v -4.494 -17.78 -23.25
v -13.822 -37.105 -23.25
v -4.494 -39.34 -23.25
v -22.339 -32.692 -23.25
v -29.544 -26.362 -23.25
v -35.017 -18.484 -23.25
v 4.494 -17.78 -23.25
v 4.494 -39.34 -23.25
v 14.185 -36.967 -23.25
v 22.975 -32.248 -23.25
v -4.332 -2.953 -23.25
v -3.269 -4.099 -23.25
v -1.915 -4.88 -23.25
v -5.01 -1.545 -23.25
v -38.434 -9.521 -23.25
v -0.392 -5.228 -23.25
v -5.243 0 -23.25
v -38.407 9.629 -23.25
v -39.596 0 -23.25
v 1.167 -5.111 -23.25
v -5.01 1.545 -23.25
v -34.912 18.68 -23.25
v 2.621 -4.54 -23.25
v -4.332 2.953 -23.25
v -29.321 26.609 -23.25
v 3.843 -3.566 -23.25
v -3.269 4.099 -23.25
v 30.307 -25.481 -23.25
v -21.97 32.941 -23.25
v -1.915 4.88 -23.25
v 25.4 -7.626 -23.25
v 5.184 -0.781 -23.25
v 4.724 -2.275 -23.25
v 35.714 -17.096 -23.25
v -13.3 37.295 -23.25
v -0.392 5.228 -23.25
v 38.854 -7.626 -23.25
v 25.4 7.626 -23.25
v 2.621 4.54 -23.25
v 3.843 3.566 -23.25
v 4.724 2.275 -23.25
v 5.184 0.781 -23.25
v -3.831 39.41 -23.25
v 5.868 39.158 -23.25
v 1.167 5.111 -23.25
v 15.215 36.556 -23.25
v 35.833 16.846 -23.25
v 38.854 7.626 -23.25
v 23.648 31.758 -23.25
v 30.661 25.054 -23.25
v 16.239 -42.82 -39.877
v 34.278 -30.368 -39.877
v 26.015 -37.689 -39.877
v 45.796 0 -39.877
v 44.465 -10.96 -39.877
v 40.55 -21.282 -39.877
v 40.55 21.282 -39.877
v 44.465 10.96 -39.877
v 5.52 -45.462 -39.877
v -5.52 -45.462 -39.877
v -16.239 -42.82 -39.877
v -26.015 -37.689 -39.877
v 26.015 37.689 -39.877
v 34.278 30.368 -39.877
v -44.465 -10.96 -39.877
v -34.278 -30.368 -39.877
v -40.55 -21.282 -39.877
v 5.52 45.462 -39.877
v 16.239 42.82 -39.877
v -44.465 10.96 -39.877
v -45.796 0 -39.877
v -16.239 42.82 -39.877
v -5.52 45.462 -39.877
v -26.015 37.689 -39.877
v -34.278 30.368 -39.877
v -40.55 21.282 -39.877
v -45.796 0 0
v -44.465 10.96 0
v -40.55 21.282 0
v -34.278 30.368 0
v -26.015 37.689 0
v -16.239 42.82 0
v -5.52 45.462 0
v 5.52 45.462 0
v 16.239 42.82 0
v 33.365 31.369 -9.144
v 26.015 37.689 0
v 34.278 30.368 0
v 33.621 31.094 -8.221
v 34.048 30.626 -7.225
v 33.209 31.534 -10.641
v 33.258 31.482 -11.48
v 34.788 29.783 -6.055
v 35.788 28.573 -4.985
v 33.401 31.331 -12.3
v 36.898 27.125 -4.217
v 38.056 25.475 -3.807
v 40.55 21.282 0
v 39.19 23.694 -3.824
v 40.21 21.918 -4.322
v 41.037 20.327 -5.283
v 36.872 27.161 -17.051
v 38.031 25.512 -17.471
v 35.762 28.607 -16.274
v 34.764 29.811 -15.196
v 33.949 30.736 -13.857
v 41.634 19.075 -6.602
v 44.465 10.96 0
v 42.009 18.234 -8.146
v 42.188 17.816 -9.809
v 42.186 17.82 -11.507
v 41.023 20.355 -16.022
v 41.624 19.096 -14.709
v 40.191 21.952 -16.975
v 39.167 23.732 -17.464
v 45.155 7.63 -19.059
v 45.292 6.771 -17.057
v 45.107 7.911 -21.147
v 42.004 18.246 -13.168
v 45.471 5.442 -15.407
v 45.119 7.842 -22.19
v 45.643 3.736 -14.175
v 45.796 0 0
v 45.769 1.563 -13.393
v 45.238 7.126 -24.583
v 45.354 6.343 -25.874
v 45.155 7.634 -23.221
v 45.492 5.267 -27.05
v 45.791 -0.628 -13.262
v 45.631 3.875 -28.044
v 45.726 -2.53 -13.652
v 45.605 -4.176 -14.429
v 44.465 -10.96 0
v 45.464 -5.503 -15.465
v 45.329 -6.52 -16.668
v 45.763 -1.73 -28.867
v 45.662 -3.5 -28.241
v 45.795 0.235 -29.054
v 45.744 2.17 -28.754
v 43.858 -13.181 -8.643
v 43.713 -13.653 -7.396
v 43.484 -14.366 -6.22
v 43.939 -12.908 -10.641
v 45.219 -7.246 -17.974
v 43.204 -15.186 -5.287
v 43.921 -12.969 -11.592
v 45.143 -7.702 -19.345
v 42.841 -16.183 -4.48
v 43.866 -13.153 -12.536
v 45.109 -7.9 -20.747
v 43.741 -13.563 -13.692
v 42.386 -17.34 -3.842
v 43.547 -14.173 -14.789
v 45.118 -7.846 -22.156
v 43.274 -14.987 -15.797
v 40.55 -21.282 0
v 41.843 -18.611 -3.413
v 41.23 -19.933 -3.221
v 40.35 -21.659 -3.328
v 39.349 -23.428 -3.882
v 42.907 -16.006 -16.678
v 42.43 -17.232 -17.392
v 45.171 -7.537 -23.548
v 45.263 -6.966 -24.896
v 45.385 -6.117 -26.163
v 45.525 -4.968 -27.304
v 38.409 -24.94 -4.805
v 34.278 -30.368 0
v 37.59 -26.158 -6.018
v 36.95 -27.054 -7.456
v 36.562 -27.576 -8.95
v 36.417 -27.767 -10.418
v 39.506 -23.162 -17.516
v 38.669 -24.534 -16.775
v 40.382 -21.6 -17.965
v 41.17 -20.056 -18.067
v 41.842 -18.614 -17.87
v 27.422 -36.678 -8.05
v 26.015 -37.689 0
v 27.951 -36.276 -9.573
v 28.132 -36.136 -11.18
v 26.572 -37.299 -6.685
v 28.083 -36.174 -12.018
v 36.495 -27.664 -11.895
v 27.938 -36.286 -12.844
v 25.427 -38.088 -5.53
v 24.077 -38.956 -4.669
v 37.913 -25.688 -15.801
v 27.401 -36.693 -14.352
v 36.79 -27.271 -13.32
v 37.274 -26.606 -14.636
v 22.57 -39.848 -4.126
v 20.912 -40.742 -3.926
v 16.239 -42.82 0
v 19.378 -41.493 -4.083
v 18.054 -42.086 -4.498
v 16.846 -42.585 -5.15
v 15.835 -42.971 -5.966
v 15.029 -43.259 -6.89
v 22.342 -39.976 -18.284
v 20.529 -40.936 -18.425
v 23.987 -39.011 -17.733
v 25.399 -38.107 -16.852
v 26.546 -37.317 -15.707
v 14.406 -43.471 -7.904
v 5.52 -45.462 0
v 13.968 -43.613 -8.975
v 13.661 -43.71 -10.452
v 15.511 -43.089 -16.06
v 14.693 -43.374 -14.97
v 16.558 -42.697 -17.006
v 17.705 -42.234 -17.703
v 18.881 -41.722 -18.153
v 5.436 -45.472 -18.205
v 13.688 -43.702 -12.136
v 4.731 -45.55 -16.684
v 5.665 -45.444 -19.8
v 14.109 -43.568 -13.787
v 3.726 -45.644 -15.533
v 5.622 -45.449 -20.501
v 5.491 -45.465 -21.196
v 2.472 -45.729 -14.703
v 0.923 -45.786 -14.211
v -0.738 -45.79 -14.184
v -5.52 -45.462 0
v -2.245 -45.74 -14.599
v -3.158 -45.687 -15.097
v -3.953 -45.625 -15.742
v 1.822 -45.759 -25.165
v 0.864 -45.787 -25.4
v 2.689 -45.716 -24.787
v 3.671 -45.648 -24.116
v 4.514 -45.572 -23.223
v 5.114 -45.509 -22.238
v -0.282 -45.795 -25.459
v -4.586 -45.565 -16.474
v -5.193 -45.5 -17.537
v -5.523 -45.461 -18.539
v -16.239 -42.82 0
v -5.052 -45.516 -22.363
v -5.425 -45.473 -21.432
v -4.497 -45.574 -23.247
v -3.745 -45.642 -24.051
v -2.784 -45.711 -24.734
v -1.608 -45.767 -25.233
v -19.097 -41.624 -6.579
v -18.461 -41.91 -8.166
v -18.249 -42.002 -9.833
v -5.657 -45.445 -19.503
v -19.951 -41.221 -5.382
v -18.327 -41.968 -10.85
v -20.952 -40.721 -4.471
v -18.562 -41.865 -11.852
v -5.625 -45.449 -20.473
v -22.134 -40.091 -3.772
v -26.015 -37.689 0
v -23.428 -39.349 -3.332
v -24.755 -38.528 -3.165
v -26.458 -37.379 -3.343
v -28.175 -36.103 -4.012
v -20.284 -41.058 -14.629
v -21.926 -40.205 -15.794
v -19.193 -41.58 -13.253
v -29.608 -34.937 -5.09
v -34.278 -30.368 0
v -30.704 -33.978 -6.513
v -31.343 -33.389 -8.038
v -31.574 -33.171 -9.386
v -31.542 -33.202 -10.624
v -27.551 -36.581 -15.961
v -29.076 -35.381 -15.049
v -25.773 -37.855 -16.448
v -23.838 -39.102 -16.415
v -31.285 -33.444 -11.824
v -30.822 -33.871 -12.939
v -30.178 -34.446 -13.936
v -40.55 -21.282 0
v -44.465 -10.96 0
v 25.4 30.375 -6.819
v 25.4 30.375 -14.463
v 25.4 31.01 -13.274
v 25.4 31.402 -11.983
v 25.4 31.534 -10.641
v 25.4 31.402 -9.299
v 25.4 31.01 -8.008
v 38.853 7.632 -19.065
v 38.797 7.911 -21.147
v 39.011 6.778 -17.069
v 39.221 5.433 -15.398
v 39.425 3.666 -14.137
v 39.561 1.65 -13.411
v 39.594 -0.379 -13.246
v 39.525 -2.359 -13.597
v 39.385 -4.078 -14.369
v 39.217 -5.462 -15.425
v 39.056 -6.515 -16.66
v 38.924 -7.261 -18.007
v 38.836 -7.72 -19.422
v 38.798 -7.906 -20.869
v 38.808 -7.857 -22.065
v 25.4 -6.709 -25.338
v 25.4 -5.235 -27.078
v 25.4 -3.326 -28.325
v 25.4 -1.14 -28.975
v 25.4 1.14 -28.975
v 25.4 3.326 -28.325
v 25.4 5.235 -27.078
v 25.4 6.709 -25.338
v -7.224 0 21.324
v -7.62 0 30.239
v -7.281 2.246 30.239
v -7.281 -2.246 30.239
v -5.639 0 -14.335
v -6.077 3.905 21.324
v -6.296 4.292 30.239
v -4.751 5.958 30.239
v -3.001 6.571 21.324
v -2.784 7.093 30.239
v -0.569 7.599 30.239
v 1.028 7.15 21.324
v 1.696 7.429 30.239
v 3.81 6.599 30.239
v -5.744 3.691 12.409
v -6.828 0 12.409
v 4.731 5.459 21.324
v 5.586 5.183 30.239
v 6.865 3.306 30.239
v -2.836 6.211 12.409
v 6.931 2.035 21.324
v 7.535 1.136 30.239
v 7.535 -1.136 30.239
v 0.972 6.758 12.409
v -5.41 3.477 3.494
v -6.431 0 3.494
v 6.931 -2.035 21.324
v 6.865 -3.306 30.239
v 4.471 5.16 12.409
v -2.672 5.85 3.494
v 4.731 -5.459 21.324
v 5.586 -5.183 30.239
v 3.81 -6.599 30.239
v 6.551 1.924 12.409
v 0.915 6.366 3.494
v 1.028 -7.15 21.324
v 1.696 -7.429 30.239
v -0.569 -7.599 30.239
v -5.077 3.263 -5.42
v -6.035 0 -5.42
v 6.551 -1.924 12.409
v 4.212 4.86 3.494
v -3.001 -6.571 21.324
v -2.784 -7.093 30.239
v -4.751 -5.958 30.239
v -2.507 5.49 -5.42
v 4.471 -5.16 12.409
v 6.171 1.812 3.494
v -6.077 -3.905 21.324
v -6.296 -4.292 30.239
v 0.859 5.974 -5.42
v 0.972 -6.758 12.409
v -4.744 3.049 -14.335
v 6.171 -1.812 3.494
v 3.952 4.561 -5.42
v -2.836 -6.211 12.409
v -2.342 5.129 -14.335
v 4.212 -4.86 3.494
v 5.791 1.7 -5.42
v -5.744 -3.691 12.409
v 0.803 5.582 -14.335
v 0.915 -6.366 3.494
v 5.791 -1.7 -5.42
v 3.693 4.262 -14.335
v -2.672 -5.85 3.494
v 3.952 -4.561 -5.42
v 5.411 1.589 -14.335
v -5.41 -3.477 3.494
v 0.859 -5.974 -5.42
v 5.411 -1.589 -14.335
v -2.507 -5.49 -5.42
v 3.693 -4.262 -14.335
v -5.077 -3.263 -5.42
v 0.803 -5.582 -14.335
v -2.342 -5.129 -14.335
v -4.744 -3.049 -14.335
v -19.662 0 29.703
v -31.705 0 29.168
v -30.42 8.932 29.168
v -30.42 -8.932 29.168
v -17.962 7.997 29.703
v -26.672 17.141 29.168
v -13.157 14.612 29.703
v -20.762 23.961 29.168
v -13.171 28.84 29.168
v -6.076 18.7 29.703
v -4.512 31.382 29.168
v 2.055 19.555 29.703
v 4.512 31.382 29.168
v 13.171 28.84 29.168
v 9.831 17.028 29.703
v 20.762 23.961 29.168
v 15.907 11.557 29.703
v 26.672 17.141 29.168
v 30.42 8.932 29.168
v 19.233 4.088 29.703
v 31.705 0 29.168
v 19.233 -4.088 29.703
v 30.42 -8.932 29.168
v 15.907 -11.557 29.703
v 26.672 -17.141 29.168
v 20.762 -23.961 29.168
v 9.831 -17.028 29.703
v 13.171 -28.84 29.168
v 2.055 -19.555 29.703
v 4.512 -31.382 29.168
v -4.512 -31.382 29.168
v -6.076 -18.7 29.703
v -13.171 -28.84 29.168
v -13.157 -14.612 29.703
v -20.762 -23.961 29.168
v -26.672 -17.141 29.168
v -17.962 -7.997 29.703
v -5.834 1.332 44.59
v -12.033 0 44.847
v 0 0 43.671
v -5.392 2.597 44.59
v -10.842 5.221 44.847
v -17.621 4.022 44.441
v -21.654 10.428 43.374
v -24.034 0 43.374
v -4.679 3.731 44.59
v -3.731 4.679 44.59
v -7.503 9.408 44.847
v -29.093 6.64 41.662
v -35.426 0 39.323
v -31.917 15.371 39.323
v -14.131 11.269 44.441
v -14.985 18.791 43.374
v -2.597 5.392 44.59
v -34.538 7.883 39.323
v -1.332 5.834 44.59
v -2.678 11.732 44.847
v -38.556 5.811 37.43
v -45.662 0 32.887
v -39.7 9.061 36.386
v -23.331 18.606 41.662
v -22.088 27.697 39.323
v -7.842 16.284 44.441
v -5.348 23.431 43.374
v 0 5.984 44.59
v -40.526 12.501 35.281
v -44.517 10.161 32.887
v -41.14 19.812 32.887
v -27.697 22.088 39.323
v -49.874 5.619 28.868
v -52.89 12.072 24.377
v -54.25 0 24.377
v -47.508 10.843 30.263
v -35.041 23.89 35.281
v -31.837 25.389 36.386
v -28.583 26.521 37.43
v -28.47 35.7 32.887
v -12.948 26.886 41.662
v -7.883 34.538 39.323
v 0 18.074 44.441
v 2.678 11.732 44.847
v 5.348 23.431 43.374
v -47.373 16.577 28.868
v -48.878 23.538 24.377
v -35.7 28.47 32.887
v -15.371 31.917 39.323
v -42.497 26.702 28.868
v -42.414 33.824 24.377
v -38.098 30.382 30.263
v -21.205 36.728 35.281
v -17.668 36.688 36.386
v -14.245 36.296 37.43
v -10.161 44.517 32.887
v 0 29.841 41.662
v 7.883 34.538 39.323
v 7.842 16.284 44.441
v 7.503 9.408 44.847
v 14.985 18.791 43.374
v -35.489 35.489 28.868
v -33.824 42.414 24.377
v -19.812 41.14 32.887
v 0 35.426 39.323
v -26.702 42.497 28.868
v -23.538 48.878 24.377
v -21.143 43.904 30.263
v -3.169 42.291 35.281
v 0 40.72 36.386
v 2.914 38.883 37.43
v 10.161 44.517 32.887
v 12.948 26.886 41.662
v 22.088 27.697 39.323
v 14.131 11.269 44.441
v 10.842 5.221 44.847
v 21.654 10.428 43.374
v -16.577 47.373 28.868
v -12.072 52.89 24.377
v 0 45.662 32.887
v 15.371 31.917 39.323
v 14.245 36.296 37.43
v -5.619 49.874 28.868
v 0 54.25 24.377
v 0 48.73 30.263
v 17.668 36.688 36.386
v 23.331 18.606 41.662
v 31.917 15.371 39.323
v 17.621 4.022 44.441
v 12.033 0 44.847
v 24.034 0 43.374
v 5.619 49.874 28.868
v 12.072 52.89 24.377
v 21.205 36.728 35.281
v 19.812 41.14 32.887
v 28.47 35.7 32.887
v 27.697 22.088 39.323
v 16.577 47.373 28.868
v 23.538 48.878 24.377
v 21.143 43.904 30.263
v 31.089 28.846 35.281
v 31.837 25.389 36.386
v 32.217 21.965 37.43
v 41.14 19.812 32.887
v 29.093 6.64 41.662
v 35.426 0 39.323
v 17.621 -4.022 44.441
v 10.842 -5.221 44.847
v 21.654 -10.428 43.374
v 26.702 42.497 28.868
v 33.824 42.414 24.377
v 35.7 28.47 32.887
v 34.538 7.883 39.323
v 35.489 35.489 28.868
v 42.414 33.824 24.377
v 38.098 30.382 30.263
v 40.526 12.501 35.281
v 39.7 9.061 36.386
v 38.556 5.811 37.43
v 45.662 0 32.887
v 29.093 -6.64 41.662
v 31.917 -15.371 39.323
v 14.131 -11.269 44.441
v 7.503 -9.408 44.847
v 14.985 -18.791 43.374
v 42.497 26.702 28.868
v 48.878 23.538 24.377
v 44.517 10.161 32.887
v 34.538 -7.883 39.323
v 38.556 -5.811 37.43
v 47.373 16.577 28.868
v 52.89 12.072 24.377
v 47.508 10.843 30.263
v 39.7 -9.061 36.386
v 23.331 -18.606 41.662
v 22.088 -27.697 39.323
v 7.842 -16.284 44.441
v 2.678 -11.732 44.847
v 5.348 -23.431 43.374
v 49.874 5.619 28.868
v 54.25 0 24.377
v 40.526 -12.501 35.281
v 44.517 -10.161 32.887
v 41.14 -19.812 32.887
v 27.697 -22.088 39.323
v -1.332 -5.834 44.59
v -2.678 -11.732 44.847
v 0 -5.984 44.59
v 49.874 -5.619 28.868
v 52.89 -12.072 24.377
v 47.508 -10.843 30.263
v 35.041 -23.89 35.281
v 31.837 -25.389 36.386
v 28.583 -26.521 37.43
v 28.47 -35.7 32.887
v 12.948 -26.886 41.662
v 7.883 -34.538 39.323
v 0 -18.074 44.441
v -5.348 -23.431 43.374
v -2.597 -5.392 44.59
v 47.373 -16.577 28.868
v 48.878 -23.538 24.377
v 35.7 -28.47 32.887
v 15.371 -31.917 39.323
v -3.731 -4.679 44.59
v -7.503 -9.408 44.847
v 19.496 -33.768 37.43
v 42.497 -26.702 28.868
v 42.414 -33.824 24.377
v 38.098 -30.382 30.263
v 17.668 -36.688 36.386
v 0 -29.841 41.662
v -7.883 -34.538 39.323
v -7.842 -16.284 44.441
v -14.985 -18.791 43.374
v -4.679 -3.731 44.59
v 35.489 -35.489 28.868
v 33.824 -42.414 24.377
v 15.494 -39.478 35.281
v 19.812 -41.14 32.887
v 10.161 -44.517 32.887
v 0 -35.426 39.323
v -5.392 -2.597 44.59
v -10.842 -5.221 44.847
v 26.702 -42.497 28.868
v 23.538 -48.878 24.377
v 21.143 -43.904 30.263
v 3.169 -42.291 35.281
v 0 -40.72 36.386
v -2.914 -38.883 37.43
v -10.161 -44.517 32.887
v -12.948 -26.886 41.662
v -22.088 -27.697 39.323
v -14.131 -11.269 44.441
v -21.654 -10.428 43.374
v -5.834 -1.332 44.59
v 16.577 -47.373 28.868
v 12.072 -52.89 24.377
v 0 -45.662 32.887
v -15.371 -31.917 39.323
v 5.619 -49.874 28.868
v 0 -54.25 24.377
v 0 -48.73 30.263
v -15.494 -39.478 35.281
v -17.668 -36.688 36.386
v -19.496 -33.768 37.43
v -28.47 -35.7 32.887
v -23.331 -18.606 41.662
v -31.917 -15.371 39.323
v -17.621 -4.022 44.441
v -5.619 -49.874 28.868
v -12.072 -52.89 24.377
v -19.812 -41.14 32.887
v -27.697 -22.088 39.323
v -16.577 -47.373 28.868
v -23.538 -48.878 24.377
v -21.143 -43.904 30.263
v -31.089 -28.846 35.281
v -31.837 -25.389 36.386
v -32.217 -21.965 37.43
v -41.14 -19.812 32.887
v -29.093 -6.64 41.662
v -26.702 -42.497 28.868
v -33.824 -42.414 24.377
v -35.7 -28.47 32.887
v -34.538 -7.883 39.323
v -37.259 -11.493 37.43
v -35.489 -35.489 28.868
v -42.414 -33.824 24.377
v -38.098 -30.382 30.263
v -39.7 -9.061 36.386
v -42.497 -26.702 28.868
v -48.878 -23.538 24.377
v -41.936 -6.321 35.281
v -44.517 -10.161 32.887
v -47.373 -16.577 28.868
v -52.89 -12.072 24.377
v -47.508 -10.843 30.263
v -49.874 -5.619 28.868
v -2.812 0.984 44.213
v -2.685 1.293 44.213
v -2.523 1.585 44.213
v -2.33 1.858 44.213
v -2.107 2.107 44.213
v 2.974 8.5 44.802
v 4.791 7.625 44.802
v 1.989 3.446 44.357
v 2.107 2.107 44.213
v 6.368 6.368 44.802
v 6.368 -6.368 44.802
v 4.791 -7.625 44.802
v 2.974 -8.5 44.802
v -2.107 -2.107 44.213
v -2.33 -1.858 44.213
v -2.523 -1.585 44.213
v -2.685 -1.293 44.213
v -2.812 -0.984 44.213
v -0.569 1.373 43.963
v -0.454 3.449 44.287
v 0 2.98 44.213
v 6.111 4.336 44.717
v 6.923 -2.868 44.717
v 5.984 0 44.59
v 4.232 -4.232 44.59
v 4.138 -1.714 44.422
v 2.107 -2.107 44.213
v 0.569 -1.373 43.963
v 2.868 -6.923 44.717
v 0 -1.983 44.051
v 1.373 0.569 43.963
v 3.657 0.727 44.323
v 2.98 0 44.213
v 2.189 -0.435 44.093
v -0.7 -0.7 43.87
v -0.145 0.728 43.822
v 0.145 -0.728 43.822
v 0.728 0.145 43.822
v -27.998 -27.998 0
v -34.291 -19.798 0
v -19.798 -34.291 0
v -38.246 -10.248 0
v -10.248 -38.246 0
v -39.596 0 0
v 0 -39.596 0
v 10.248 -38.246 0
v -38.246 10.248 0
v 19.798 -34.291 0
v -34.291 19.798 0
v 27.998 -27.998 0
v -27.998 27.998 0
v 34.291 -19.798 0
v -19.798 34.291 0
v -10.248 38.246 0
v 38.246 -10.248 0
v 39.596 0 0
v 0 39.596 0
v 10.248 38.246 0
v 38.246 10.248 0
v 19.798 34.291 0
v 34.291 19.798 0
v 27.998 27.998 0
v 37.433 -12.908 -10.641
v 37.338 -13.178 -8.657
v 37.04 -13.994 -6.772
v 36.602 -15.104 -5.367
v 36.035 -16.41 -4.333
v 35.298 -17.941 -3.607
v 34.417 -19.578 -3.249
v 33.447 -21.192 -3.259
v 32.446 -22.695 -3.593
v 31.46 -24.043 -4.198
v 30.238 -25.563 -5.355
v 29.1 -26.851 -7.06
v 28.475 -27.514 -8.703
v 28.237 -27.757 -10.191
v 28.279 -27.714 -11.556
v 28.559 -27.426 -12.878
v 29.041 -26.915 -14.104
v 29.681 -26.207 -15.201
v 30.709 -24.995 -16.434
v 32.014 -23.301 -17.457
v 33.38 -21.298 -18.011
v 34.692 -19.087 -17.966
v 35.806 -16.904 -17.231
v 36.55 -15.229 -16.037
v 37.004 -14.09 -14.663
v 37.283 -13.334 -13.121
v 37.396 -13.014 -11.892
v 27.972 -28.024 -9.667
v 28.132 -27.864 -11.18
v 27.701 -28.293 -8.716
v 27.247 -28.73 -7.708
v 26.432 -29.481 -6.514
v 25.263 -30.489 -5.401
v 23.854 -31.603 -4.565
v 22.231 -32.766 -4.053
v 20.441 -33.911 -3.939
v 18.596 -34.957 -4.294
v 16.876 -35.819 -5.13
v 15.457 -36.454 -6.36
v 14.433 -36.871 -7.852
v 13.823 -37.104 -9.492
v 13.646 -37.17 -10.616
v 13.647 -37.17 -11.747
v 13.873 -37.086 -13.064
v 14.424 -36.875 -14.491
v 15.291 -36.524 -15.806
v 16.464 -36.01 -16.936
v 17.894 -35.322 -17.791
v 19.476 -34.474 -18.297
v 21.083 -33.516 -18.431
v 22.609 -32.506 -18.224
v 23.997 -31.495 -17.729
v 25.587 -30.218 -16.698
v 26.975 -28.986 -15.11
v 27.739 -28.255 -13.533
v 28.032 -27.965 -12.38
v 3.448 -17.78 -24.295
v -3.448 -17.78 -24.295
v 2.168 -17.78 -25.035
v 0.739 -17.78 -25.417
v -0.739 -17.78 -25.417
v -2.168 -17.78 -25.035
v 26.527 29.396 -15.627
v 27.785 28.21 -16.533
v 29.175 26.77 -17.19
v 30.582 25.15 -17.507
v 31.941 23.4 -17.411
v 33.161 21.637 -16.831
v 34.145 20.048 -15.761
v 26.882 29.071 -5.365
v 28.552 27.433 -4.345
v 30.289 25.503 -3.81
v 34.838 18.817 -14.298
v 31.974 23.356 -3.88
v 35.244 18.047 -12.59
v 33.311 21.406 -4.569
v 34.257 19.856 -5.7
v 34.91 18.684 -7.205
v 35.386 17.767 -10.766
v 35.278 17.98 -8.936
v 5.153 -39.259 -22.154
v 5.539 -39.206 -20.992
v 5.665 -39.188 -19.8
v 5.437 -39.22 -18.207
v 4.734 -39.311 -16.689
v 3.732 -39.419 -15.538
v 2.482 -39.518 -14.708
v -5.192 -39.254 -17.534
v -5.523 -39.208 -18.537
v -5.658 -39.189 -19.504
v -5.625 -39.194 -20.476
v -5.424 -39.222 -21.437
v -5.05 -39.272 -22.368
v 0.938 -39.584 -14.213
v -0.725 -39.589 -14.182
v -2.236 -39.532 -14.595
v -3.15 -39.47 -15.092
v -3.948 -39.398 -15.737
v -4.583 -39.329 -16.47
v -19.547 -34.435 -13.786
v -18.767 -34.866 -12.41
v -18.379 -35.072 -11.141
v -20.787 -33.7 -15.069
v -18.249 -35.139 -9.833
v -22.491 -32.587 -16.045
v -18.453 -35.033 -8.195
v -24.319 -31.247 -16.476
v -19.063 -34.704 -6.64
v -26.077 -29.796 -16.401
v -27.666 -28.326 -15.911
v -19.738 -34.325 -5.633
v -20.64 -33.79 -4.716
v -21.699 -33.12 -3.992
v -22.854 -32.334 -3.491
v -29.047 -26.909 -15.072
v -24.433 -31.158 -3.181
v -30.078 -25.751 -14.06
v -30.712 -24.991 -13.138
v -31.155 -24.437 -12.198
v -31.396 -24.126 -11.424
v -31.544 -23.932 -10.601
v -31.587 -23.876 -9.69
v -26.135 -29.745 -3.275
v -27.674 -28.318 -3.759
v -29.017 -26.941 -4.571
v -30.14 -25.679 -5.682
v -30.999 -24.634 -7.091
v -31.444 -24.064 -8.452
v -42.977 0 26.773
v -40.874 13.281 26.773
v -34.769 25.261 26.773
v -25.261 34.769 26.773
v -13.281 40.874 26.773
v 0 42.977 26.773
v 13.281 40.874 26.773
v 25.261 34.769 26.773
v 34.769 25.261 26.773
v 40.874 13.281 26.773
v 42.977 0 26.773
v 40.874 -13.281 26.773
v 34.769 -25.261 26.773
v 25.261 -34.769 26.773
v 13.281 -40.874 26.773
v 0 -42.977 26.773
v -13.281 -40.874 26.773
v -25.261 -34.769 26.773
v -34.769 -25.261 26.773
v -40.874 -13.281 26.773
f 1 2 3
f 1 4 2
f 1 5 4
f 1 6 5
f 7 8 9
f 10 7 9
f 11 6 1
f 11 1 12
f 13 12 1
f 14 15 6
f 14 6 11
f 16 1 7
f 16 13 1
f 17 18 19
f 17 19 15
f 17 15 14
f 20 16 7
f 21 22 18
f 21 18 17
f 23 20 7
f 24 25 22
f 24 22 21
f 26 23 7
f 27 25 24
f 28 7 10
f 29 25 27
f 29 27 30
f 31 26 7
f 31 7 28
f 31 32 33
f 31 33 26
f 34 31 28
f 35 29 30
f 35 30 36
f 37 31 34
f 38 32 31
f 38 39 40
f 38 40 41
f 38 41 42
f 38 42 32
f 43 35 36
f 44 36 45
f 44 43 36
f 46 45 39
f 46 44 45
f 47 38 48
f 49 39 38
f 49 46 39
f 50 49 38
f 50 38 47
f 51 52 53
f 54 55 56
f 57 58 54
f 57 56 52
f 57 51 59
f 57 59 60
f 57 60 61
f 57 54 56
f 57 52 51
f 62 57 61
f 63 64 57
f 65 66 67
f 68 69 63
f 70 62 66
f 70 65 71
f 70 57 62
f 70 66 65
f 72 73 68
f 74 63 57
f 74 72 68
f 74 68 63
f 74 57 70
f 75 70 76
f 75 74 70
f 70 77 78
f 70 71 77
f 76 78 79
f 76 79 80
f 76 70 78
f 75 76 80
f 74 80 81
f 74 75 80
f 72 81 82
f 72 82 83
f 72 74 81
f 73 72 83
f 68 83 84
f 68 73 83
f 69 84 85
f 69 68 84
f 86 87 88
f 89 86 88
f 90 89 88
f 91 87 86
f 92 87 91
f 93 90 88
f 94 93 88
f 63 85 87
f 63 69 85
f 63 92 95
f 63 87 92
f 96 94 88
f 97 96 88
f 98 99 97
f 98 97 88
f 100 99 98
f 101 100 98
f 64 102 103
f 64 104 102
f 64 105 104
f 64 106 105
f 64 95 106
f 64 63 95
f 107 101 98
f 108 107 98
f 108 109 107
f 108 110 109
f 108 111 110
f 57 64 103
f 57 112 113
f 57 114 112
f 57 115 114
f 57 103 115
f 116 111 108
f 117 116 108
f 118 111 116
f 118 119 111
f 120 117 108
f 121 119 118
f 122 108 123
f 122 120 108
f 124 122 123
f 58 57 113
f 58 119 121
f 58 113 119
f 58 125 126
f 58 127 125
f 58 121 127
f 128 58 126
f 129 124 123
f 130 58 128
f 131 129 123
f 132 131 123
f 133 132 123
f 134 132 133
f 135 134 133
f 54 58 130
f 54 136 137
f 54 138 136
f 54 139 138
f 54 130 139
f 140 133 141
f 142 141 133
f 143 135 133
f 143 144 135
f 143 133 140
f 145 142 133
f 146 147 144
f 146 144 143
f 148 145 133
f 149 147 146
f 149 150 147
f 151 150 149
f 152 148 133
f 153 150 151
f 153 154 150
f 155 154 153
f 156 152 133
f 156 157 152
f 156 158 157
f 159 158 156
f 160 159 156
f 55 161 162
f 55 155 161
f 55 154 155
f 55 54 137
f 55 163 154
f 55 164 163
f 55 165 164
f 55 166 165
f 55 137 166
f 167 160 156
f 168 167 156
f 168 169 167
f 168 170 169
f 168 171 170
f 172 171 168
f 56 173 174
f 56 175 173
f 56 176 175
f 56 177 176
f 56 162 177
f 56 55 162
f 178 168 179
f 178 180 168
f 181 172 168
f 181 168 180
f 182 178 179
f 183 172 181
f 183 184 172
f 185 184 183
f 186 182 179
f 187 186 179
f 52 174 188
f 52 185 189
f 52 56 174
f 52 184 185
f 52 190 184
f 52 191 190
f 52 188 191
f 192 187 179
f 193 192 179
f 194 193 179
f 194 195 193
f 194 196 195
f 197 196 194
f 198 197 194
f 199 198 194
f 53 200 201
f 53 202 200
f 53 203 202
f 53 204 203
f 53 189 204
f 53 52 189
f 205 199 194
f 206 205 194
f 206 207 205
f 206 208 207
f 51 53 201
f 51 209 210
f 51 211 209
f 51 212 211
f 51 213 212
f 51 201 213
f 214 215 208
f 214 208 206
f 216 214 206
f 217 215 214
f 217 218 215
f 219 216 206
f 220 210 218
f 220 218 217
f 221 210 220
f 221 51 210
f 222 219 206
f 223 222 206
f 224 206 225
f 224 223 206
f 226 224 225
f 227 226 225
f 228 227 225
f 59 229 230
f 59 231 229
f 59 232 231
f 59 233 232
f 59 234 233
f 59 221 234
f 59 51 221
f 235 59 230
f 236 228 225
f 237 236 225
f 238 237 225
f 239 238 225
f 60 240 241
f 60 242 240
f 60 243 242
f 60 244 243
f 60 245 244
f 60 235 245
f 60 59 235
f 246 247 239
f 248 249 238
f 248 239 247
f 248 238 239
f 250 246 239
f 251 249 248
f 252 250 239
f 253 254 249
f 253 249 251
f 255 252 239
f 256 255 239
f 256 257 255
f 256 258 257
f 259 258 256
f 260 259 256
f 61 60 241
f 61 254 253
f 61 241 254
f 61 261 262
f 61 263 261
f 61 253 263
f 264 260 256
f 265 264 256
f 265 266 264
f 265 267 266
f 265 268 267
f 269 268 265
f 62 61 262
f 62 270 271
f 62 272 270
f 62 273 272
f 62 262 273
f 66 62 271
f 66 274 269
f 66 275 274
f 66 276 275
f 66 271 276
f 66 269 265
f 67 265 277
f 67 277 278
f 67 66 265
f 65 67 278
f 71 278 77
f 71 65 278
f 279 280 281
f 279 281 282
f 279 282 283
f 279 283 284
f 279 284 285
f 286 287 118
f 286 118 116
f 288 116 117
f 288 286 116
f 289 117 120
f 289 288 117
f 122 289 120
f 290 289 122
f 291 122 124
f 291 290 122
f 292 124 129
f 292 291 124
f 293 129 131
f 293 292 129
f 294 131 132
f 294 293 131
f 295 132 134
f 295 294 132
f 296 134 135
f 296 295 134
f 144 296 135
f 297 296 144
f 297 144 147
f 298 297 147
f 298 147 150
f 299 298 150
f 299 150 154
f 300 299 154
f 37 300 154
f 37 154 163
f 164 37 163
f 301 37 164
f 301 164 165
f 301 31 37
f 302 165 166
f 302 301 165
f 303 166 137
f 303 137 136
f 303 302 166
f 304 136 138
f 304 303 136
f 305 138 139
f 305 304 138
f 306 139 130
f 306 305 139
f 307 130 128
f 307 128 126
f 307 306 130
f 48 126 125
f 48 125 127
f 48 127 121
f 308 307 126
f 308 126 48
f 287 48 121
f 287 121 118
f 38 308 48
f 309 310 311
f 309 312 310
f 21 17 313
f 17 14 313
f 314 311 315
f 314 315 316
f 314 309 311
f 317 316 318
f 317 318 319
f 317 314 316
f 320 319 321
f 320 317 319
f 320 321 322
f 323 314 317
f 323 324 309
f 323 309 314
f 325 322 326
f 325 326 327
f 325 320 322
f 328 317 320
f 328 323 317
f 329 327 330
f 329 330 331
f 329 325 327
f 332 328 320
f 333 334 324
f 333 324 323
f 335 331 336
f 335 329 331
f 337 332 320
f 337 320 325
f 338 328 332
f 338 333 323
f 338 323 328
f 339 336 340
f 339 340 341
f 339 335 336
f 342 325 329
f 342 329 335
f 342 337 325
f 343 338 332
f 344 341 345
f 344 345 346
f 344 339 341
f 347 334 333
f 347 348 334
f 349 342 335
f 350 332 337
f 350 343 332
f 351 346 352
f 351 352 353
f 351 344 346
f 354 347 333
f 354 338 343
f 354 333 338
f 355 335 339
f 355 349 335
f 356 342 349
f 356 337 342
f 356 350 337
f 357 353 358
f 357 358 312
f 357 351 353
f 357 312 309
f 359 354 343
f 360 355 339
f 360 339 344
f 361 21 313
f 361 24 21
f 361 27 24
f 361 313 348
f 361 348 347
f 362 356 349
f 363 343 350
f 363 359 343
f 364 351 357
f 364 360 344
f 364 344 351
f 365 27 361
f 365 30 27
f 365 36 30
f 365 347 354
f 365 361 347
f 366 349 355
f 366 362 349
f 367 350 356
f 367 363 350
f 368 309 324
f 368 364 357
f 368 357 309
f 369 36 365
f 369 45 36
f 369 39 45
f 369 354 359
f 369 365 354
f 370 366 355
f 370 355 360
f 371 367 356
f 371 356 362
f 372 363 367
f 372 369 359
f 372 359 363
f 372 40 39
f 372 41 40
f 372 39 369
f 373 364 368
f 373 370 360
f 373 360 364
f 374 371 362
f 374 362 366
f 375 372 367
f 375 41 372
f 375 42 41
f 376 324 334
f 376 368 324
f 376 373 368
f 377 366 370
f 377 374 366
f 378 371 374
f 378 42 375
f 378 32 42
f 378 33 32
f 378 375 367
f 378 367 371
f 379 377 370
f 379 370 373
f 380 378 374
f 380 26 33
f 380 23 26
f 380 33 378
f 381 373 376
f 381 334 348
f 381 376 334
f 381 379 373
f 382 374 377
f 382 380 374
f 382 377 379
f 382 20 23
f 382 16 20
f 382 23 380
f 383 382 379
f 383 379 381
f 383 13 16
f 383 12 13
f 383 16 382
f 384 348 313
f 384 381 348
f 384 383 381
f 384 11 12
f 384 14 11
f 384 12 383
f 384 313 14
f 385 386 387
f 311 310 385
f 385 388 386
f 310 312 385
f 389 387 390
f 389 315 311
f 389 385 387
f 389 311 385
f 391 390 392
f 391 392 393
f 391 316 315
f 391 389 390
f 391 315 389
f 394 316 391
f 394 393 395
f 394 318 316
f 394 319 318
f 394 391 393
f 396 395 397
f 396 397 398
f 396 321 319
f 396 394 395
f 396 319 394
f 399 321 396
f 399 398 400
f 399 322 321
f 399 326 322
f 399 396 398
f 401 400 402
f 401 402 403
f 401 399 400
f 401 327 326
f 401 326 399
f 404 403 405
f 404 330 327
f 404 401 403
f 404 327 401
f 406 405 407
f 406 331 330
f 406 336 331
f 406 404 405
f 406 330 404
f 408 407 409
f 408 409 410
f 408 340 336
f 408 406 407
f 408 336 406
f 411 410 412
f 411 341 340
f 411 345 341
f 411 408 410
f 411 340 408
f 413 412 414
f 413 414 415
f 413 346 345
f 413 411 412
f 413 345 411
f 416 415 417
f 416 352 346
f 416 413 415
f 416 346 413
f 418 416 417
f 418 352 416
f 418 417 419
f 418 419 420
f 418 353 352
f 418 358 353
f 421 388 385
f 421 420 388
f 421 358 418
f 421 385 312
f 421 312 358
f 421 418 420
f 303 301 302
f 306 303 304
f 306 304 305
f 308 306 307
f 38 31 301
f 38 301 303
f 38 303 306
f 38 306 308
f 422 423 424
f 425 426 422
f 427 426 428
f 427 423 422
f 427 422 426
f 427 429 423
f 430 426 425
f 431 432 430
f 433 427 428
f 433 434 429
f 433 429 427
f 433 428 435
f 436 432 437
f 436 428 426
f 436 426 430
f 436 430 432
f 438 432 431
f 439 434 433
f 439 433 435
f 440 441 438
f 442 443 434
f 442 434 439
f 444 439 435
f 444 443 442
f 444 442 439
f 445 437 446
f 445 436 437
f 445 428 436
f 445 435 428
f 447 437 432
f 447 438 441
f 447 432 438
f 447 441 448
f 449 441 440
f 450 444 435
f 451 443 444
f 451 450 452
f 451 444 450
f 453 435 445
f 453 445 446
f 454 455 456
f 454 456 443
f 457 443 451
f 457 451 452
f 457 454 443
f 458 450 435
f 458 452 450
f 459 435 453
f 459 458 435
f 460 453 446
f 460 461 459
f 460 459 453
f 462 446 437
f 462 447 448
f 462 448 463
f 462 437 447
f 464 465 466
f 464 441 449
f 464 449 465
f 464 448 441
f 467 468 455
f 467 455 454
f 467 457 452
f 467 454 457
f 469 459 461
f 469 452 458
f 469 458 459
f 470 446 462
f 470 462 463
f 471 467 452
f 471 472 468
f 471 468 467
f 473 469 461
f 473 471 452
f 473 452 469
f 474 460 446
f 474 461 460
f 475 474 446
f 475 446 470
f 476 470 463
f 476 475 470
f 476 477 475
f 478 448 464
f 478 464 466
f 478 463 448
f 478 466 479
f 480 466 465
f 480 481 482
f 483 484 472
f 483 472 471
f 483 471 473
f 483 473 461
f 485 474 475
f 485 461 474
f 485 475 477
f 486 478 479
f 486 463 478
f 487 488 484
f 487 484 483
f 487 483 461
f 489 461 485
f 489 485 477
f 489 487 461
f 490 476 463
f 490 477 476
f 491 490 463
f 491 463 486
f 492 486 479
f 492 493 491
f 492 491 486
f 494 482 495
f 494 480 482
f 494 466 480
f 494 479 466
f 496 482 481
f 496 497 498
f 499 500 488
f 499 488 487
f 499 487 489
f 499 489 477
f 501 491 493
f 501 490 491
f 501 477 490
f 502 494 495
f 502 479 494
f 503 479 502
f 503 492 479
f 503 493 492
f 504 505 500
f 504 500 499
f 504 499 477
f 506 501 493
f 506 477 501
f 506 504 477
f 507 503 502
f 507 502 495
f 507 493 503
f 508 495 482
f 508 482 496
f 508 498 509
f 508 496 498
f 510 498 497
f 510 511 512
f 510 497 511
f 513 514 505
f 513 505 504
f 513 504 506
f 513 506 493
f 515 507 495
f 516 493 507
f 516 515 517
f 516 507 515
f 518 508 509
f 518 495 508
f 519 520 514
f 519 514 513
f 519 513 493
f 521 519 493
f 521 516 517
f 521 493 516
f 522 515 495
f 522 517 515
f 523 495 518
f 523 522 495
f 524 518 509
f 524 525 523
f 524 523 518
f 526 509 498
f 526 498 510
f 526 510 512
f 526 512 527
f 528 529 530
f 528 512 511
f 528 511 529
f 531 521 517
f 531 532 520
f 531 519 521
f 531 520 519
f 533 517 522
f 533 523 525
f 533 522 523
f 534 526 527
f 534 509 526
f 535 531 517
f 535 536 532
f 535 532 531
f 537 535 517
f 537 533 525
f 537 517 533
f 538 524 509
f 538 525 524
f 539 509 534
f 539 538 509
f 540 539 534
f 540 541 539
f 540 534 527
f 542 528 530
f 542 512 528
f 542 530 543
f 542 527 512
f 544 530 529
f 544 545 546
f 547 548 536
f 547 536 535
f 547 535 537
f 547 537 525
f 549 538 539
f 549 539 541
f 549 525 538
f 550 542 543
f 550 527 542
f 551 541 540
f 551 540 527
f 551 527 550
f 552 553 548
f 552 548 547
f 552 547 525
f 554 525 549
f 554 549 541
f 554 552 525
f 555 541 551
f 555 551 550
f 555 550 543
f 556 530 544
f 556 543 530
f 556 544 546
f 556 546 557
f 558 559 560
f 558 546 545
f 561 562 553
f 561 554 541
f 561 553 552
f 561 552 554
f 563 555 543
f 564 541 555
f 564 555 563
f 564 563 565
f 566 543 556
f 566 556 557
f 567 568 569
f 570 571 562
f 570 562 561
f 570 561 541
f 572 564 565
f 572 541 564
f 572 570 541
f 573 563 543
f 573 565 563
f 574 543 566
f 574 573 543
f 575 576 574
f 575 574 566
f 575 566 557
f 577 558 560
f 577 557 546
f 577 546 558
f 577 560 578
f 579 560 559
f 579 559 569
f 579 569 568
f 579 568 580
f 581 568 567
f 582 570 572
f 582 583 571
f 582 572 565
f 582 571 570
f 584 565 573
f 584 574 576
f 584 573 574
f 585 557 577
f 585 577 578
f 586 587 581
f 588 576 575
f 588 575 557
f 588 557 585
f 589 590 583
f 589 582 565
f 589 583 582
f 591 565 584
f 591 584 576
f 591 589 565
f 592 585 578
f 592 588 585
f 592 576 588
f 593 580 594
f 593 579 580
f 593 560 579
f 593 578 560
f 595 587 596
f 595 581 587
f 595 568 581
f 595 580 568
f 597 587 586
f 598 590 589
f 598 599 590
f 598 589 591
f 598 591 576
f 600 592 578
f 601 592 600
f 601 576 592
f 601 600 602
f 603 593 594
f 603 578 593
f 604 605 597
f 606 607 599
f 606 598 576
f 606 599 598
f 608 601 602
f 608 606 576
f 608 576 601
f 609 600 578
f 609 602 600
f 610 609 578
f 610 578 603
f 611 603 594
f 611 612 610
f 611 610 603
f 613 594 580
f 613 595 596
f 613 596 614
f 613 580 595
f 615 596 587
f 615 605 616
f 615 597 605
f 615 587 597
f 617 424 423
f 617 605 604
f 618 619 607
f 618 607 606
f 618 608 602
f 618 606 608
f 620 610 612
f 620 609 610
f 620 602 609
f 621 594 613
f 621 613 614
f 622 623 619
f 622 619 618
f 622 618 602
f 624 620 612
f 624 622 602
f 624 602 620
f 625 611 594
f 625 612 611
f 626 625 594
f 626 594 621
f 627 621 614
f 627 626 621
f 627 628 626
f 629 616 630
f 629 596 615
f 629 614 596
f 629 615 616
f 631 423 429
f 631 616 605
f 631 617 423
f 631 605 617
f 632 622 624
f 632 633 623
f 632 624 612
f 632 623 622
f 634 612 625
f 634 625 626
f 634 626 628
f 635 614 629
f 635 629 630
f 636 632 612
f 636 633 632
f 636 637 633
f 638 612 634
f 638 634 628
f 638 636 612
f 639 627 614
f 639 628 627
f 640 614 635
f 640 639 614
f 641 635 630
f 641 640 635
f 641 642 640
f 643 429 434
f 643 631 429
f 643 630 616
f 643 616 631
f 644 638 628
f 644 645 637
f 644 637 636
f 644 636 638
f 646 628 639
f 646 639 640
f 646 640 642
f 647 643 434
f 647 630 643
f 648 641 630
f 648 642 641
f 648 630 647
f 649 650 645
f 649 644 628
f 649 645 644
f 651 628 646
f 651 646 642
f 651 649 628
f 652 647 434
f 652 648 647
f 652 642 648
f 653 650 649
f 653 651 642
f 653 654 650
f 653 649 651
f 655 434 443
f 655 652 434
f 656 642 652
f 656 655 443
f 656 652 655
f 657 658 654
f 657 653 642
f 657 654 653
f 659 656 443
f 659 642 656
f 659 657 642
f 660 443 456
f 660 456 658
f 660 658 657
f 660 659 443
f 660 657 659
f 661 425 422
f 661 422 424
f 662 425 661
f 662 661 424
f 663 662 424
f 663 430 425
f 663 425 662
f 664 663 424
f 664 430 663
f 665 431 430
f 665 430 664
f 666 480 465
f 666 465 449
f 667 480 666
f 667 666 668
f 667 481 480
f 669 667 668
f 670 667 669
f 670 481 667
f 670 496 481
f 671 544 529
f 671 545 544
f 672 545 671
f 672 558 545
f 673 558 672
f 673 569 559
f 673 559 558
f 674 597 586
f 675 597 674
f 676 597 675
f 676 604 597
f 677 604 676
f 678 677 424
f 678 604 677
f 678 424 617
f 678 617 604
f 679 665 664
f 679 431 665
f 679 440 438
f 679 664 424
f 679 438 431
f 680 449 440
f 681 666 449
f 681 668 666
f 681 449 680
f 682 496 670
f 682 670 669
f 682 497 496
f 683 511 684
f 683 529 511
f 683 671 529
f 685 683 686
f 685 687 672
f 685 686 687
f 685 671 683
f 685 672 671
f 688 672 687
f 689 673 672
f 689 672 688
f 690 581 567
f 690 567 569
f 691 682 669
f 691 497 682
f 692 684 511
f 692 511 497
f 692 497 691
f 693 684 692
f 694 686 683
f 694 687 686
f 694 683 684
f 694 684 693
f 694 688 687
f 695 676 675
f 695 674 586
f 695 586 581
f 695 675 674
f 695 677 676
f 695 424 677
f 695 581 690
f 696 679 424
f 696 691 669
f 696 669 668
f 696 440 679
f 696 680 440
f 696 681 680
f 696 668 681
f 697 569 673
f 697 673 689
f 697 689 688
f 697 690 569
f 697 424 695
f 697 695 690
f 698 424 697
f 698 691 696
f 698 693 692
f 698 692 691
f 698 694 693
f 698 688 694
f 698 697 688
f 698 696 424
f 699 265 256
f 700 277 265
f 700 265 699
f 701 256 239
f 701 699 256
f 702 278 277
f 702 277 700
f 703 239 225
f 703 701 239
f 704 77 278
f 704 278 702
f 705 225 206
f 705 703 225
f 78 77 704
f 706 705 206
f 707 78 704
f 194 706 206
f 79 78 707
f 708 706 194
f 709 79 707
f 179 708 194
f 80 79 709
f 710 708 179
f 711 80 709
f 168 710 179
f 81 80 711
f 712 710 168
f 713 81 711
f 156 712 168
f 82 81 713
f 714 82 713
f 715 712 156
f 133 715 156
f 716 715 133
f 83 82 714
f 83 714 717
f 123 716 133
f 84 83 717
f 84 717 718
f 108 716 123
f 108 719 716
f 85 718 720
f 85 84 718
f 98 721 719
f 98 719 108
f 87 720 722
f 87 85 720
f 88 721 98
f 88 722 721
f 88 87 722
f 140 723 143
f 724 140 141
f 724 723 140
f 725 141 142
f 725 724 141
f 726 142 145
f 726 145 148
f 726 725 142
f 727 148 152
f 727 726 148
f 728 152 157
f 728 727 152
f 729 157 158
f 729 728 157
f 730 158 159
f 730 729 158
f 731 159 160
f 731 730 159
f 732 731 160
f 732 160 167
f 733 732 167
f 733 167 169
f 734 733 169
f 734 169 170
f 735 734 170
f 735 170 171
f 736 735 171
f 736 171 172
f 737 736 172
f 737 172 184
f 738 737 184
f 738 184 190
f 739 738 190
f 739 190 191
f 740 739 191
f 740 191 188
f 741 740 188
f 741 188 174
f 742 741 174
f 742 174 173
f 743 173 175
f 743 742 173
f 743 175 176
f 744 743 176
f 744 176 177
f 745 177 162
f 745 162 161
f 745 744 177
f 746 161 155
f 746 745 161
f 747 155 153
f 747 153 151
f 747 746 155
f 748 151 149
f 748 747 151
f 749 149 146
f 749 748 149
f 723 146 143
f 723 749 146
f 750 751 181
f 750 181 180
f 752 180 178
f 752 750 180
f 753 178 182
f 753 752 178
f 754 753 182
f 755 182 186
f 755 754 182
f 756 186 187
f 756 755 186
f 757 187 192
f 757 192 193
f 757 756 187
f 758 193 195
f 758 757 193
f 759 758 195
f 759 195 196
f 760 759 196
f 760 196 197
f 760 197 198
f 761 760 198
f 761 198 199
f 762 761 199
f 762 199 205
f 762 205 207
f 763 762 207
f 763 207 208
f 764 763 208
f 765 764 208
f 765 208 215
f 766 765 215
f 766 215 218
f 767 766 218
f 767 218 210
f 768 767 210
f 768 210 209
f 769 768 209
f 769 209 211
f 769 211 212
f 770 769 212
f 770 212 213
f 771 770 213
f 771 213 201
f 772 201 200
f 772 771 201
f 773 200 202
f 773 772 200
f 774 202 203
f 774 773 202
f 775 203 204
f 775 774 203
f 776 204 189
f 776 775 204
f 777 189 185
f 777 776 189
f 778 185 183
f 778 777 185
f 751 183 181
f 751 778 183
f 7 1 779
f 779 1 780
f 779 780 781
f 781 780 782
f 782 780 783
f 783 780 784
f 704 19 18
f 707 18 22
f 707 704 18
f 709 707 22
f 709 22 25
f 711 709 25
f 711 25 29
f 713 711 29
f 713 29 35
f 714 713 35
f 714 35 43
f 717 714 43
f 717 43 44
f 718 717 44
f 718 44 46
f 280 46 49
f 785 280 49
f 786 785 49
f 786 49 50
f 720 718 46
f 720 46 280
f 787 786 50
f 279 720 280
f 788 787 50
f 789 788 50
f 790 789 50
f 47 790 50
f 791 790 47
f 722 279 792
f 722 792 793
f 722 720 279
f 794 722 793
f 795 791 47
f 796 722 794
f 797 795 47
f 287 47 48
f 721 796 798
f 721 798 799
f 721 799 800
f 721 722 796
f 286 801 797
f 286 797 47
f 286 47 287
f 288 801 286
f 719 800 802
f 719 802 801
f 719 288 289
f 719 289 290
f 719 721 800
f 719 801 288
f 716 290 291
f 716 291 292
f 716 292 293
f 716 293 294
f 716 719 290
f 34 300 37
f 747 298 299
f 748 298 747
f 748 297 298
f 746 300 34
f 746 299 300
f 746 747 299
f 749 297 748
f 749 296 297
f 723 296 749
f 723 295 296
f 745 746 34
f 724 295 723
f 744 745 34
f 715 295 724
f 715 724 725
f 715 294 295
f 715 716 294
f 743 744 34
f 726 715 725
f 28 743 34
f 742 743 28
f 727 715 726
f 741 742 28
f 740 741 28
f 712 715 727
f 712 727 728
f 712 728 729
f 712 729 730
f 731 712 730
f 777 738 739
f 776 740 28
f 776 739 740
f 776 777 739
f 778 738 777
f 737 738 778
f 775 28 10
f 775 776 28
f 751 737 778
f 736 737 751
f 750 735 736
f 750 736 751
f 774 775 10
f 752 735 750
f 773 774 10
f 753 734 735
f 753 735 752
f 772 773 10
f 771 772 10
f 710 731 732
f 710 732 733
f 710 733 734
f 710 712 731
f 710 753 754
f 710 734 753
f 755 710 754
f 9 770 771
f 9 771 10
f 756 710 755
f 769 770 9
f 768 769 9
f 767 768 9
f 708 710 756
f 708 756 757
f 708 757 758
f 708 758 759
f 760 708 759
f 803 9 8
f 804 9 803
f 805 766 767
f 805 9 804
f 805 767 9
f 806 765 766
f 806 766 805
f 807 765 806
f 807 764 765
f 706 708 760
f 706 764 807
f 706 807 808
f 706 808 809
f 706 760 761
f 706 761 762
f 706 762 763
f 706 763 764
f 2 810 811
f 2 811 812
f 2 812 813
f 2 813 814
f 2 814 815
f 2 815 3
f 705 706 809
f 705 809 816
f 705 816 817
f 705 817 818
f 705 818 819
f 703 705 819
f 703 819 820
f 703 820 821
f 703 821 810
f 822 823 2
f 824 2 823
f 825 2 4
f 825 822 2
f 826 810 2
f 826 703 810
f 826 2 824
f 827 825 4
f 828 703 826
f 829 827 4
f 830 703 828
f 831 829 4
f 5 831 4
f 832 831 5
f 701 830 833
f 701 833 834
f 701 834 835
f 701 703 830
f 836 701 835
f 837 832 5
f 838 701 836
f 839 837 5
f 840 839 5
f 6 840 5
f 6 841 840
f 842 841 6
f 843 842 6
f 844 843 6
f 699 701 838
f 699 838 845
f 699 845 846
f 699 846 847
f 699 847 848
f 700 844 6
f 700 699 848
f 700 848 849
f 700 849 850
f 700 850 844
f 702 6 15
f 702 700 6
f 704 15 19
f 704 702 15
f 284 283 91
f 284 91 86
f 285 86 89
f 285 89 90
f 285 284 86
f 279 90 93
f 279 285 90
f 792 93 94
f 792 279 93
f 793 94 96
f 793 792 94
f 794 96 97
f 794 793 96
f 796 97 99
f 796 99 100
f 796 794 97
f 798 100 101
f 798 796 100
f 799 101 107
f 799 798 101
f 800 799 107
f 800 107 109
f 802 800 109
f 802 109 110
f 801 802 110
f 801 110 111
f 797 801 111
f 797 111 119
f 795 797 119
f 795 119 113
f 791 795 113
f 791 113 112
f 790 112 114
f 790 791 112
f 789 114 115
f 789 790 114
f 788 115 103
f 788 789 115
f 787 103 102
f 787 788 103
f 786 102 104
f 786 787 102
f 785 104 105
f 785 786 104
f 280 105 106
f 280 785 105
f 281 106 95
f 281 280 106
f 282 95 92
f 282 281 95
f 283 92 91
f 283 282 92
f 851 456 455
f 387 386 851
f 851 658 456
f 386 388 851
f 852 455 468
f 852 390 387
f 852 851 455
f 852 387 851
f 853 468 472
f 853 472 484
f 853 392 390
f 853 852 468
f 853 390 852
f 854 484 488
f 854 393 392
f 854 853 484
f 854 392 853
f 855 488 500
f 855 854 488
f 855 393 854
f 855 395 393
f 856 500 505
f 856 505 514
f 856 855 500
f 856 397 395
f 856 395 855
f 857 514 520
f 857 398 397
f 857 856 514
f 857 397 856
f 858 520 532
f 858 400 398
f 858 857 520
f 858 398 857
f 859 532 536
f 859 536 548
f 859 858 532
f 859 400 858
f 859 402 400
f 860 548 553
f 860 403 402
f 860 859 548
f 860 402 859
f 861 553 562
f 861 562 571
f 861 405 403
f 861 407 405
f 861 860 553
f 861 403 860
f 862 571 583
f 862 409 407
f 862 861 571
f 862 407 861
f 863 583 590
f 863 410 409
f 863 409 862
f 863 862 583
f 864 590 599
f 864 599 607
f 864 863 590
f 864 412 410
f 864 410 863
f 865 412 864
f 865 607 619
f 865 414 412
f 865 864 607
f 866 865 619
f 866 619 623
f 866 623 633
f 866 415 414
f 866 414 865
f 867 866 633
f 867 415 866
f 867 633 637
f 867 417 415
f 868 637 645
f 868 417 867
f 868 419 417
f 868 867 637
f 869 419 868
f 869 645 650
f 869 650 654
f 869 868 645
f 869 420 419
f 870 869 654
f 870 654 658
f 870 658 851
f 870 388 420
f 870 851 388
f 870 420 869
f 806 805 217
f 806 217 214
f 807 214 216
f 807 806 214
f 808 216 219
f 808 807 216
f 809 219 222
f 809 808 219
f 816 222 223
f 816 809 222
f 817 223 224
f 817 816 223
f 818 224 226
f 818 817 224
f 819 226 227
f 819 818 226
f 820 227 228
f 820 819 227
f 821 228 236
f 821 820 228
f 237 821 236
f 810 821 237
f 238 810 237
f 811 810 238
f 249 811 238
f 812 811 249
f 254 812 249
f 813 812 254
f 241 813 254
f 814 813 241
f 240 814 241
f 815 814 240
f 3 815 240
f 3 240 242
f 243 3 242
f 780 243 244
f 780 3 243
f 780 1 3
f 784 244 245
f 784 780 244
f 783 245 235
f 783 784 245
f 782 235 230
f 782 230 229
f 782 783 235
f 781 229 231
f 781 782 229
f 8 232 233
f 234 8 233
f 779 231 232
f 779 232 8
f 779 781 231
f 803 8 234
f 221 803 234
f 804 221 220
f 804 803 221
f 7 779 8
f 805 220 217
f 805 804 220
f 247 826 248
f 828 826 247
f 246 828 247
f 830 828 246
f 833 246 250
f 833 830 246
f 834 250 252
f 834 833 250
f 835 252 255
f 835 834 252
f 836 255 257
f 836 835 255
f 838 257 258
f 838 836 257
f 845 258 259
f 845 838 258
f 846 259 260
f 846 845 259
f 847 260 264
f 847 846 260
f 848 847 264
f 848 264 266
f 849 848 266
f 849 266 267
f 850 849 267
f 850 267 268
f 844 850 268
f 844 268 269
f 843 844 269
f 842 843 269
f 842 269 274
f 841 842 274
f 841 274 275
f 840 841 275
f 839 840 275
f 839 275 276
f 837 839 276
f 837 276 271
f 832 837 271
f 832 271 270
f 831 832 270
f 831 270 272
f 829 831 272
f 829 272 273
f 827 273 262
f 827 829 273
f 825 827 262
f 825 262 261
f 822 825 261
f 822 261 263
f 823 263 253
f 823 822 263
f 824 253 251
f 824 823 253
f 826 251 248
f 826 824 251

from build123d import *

# Parameters (mm, degrees)
F3_R     = 5.665286
F3_R_2   = 7.253656
F3_R_3   = 6.669881
F4_DEPTH = 127
F6_R     = 7.910511
F6_R_2   = 7.431564
F6_R_3   = 6.884056
F7_DEPTH = 25.4


with BuildPart() as f1:
    # F0 (on Front) → F1 (revolve)
    with BuildSketch(Plane.XZ):
        with BuildLine():
            Line((-45.795509, 0), (-45.795509, -23.250027))
            Line((-45.795509, -23.250027), (-45.795509, -39.877315))
            Line((-45.795509, -39.877315), (0, -39.877315))
            Line((0, -39.877315), (0, -23.250027))
            Line((0, -23.250027), (0, 43.671444))
            ThreePointArc((0, 43.671444), (-29.841198, 41.661526), (-54.250058, 24.377299))
            Line((-54.250058, 24.377299), (-31.70458, 29.168213))
            Line((-31.70458, 29.168213), (-7.62, 30.238641))
            Line((-7.62, 30.238641), (-5.242722, -23.250027))
            Line((-5.242722, -23.250027), (-39.5955, -23.250027))
            Line((-39.5955, -23.250027), (-39.5955, 0))
            Line((-39.5955, 0), (-45.795509, 0))
        make_face()
    revolve(axis=Axis((0, 0, -2.677274), (0, 0, -1)))

    # F3 (on offset) → F4 (cut)
    with BuildSketch(Plane.XZ.offset(17.78)):
        with Locations((0, -19.800454)):
            Circle(F3_R)
        with Locations((20.878028, -11.179848)):
            Circle(F3_R_2)
        with Locations((-24.91894, -9.832879)):
            Circle(F3_R_3)
    extrude(amount=F4_DEPTH, mode=Mode.SUBTRACT)

    # F6 (on offset) → F7 (cut)
    with BuildSketch(Plane.YZ.offset(25.4)):
        with Locations((0, -21.147424)):
            Circle(F6_R)
        with Locations((-20.339243, -10.641061)):
            Circle(F6_R_2)
        with Locations((24.649547, -10.641061)):
            Circle(F6_R_3)
    extrude(amount=F7_DEPTH, mode=Mode.SUBTRACT)


solid = f1.part
